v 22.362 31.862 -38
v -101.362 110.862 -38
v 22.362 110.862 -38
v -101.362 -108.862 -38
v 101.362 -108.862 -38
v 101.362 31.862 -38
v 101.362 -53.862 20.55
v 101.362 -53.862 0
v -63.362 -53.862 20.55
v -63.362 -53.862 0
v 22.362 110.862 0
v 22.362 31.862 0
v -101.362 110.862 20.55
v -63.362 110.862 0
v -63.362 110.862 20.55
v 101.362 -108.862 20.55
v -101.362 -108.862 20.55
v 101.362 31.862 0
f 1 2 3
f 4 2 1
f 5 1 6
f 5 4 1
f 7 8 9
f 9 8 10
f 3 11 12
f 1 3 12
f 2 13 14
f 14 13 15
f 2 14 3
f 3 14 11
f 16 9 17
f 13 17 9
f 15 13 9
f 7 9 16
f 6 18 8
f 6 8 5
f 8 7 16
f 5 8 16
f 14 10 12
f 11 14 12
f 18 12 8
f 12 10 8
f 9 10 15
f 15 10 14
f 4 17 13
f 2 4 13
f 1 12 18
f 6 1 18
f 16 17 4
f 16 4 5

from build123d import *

# Parameters (mm, degrees)
F1_DEPTH = 20.55
F3_DEPTH = 38
F4_W     = 202.725
F4_H     = 2
F5_DEPTH = 58.551


with BuildPart() as f1:
    # F0 (on Top) → F1 (new body)
    with BuildSketch(Plane.XY):
        Polygon((-63.3625, 110.8625), (-101.3625, 110.8625), (-101.3625, -110.8625), (101.3625, -110.8625), (101.3625, -53.8625), (-63.3625, -53.8625), align=None)
    extrude(amount=F1_DEPTH)

    # F2 (on face) → F3 (join)
    with BuildSketch(Plane(origin=(0, 0, 0), x_dir=(1, 0, 0), z_dir=(0, 0, -1))):
        Polygon((101.3625, -31.8625), (101.3625, 110.8625), (-101.3625, 110.8625), (-101.3625, -110.8625), (22.3625, -110.8625), (22.3625, -31.8625), align=None)
    extrude(amount=F3_DEPTH)

    # F4 (on face) → F5 (cut, through all)
    with BuildSketch(Plane.XY.offset(20.55)):
        with Locations((0, -109.8625)):
            Rectangle(F4_W, F4_H)
    extrude(amount=-F5_DEPTH, mode=Mode.SUBTRACT)


solid = f1.part
